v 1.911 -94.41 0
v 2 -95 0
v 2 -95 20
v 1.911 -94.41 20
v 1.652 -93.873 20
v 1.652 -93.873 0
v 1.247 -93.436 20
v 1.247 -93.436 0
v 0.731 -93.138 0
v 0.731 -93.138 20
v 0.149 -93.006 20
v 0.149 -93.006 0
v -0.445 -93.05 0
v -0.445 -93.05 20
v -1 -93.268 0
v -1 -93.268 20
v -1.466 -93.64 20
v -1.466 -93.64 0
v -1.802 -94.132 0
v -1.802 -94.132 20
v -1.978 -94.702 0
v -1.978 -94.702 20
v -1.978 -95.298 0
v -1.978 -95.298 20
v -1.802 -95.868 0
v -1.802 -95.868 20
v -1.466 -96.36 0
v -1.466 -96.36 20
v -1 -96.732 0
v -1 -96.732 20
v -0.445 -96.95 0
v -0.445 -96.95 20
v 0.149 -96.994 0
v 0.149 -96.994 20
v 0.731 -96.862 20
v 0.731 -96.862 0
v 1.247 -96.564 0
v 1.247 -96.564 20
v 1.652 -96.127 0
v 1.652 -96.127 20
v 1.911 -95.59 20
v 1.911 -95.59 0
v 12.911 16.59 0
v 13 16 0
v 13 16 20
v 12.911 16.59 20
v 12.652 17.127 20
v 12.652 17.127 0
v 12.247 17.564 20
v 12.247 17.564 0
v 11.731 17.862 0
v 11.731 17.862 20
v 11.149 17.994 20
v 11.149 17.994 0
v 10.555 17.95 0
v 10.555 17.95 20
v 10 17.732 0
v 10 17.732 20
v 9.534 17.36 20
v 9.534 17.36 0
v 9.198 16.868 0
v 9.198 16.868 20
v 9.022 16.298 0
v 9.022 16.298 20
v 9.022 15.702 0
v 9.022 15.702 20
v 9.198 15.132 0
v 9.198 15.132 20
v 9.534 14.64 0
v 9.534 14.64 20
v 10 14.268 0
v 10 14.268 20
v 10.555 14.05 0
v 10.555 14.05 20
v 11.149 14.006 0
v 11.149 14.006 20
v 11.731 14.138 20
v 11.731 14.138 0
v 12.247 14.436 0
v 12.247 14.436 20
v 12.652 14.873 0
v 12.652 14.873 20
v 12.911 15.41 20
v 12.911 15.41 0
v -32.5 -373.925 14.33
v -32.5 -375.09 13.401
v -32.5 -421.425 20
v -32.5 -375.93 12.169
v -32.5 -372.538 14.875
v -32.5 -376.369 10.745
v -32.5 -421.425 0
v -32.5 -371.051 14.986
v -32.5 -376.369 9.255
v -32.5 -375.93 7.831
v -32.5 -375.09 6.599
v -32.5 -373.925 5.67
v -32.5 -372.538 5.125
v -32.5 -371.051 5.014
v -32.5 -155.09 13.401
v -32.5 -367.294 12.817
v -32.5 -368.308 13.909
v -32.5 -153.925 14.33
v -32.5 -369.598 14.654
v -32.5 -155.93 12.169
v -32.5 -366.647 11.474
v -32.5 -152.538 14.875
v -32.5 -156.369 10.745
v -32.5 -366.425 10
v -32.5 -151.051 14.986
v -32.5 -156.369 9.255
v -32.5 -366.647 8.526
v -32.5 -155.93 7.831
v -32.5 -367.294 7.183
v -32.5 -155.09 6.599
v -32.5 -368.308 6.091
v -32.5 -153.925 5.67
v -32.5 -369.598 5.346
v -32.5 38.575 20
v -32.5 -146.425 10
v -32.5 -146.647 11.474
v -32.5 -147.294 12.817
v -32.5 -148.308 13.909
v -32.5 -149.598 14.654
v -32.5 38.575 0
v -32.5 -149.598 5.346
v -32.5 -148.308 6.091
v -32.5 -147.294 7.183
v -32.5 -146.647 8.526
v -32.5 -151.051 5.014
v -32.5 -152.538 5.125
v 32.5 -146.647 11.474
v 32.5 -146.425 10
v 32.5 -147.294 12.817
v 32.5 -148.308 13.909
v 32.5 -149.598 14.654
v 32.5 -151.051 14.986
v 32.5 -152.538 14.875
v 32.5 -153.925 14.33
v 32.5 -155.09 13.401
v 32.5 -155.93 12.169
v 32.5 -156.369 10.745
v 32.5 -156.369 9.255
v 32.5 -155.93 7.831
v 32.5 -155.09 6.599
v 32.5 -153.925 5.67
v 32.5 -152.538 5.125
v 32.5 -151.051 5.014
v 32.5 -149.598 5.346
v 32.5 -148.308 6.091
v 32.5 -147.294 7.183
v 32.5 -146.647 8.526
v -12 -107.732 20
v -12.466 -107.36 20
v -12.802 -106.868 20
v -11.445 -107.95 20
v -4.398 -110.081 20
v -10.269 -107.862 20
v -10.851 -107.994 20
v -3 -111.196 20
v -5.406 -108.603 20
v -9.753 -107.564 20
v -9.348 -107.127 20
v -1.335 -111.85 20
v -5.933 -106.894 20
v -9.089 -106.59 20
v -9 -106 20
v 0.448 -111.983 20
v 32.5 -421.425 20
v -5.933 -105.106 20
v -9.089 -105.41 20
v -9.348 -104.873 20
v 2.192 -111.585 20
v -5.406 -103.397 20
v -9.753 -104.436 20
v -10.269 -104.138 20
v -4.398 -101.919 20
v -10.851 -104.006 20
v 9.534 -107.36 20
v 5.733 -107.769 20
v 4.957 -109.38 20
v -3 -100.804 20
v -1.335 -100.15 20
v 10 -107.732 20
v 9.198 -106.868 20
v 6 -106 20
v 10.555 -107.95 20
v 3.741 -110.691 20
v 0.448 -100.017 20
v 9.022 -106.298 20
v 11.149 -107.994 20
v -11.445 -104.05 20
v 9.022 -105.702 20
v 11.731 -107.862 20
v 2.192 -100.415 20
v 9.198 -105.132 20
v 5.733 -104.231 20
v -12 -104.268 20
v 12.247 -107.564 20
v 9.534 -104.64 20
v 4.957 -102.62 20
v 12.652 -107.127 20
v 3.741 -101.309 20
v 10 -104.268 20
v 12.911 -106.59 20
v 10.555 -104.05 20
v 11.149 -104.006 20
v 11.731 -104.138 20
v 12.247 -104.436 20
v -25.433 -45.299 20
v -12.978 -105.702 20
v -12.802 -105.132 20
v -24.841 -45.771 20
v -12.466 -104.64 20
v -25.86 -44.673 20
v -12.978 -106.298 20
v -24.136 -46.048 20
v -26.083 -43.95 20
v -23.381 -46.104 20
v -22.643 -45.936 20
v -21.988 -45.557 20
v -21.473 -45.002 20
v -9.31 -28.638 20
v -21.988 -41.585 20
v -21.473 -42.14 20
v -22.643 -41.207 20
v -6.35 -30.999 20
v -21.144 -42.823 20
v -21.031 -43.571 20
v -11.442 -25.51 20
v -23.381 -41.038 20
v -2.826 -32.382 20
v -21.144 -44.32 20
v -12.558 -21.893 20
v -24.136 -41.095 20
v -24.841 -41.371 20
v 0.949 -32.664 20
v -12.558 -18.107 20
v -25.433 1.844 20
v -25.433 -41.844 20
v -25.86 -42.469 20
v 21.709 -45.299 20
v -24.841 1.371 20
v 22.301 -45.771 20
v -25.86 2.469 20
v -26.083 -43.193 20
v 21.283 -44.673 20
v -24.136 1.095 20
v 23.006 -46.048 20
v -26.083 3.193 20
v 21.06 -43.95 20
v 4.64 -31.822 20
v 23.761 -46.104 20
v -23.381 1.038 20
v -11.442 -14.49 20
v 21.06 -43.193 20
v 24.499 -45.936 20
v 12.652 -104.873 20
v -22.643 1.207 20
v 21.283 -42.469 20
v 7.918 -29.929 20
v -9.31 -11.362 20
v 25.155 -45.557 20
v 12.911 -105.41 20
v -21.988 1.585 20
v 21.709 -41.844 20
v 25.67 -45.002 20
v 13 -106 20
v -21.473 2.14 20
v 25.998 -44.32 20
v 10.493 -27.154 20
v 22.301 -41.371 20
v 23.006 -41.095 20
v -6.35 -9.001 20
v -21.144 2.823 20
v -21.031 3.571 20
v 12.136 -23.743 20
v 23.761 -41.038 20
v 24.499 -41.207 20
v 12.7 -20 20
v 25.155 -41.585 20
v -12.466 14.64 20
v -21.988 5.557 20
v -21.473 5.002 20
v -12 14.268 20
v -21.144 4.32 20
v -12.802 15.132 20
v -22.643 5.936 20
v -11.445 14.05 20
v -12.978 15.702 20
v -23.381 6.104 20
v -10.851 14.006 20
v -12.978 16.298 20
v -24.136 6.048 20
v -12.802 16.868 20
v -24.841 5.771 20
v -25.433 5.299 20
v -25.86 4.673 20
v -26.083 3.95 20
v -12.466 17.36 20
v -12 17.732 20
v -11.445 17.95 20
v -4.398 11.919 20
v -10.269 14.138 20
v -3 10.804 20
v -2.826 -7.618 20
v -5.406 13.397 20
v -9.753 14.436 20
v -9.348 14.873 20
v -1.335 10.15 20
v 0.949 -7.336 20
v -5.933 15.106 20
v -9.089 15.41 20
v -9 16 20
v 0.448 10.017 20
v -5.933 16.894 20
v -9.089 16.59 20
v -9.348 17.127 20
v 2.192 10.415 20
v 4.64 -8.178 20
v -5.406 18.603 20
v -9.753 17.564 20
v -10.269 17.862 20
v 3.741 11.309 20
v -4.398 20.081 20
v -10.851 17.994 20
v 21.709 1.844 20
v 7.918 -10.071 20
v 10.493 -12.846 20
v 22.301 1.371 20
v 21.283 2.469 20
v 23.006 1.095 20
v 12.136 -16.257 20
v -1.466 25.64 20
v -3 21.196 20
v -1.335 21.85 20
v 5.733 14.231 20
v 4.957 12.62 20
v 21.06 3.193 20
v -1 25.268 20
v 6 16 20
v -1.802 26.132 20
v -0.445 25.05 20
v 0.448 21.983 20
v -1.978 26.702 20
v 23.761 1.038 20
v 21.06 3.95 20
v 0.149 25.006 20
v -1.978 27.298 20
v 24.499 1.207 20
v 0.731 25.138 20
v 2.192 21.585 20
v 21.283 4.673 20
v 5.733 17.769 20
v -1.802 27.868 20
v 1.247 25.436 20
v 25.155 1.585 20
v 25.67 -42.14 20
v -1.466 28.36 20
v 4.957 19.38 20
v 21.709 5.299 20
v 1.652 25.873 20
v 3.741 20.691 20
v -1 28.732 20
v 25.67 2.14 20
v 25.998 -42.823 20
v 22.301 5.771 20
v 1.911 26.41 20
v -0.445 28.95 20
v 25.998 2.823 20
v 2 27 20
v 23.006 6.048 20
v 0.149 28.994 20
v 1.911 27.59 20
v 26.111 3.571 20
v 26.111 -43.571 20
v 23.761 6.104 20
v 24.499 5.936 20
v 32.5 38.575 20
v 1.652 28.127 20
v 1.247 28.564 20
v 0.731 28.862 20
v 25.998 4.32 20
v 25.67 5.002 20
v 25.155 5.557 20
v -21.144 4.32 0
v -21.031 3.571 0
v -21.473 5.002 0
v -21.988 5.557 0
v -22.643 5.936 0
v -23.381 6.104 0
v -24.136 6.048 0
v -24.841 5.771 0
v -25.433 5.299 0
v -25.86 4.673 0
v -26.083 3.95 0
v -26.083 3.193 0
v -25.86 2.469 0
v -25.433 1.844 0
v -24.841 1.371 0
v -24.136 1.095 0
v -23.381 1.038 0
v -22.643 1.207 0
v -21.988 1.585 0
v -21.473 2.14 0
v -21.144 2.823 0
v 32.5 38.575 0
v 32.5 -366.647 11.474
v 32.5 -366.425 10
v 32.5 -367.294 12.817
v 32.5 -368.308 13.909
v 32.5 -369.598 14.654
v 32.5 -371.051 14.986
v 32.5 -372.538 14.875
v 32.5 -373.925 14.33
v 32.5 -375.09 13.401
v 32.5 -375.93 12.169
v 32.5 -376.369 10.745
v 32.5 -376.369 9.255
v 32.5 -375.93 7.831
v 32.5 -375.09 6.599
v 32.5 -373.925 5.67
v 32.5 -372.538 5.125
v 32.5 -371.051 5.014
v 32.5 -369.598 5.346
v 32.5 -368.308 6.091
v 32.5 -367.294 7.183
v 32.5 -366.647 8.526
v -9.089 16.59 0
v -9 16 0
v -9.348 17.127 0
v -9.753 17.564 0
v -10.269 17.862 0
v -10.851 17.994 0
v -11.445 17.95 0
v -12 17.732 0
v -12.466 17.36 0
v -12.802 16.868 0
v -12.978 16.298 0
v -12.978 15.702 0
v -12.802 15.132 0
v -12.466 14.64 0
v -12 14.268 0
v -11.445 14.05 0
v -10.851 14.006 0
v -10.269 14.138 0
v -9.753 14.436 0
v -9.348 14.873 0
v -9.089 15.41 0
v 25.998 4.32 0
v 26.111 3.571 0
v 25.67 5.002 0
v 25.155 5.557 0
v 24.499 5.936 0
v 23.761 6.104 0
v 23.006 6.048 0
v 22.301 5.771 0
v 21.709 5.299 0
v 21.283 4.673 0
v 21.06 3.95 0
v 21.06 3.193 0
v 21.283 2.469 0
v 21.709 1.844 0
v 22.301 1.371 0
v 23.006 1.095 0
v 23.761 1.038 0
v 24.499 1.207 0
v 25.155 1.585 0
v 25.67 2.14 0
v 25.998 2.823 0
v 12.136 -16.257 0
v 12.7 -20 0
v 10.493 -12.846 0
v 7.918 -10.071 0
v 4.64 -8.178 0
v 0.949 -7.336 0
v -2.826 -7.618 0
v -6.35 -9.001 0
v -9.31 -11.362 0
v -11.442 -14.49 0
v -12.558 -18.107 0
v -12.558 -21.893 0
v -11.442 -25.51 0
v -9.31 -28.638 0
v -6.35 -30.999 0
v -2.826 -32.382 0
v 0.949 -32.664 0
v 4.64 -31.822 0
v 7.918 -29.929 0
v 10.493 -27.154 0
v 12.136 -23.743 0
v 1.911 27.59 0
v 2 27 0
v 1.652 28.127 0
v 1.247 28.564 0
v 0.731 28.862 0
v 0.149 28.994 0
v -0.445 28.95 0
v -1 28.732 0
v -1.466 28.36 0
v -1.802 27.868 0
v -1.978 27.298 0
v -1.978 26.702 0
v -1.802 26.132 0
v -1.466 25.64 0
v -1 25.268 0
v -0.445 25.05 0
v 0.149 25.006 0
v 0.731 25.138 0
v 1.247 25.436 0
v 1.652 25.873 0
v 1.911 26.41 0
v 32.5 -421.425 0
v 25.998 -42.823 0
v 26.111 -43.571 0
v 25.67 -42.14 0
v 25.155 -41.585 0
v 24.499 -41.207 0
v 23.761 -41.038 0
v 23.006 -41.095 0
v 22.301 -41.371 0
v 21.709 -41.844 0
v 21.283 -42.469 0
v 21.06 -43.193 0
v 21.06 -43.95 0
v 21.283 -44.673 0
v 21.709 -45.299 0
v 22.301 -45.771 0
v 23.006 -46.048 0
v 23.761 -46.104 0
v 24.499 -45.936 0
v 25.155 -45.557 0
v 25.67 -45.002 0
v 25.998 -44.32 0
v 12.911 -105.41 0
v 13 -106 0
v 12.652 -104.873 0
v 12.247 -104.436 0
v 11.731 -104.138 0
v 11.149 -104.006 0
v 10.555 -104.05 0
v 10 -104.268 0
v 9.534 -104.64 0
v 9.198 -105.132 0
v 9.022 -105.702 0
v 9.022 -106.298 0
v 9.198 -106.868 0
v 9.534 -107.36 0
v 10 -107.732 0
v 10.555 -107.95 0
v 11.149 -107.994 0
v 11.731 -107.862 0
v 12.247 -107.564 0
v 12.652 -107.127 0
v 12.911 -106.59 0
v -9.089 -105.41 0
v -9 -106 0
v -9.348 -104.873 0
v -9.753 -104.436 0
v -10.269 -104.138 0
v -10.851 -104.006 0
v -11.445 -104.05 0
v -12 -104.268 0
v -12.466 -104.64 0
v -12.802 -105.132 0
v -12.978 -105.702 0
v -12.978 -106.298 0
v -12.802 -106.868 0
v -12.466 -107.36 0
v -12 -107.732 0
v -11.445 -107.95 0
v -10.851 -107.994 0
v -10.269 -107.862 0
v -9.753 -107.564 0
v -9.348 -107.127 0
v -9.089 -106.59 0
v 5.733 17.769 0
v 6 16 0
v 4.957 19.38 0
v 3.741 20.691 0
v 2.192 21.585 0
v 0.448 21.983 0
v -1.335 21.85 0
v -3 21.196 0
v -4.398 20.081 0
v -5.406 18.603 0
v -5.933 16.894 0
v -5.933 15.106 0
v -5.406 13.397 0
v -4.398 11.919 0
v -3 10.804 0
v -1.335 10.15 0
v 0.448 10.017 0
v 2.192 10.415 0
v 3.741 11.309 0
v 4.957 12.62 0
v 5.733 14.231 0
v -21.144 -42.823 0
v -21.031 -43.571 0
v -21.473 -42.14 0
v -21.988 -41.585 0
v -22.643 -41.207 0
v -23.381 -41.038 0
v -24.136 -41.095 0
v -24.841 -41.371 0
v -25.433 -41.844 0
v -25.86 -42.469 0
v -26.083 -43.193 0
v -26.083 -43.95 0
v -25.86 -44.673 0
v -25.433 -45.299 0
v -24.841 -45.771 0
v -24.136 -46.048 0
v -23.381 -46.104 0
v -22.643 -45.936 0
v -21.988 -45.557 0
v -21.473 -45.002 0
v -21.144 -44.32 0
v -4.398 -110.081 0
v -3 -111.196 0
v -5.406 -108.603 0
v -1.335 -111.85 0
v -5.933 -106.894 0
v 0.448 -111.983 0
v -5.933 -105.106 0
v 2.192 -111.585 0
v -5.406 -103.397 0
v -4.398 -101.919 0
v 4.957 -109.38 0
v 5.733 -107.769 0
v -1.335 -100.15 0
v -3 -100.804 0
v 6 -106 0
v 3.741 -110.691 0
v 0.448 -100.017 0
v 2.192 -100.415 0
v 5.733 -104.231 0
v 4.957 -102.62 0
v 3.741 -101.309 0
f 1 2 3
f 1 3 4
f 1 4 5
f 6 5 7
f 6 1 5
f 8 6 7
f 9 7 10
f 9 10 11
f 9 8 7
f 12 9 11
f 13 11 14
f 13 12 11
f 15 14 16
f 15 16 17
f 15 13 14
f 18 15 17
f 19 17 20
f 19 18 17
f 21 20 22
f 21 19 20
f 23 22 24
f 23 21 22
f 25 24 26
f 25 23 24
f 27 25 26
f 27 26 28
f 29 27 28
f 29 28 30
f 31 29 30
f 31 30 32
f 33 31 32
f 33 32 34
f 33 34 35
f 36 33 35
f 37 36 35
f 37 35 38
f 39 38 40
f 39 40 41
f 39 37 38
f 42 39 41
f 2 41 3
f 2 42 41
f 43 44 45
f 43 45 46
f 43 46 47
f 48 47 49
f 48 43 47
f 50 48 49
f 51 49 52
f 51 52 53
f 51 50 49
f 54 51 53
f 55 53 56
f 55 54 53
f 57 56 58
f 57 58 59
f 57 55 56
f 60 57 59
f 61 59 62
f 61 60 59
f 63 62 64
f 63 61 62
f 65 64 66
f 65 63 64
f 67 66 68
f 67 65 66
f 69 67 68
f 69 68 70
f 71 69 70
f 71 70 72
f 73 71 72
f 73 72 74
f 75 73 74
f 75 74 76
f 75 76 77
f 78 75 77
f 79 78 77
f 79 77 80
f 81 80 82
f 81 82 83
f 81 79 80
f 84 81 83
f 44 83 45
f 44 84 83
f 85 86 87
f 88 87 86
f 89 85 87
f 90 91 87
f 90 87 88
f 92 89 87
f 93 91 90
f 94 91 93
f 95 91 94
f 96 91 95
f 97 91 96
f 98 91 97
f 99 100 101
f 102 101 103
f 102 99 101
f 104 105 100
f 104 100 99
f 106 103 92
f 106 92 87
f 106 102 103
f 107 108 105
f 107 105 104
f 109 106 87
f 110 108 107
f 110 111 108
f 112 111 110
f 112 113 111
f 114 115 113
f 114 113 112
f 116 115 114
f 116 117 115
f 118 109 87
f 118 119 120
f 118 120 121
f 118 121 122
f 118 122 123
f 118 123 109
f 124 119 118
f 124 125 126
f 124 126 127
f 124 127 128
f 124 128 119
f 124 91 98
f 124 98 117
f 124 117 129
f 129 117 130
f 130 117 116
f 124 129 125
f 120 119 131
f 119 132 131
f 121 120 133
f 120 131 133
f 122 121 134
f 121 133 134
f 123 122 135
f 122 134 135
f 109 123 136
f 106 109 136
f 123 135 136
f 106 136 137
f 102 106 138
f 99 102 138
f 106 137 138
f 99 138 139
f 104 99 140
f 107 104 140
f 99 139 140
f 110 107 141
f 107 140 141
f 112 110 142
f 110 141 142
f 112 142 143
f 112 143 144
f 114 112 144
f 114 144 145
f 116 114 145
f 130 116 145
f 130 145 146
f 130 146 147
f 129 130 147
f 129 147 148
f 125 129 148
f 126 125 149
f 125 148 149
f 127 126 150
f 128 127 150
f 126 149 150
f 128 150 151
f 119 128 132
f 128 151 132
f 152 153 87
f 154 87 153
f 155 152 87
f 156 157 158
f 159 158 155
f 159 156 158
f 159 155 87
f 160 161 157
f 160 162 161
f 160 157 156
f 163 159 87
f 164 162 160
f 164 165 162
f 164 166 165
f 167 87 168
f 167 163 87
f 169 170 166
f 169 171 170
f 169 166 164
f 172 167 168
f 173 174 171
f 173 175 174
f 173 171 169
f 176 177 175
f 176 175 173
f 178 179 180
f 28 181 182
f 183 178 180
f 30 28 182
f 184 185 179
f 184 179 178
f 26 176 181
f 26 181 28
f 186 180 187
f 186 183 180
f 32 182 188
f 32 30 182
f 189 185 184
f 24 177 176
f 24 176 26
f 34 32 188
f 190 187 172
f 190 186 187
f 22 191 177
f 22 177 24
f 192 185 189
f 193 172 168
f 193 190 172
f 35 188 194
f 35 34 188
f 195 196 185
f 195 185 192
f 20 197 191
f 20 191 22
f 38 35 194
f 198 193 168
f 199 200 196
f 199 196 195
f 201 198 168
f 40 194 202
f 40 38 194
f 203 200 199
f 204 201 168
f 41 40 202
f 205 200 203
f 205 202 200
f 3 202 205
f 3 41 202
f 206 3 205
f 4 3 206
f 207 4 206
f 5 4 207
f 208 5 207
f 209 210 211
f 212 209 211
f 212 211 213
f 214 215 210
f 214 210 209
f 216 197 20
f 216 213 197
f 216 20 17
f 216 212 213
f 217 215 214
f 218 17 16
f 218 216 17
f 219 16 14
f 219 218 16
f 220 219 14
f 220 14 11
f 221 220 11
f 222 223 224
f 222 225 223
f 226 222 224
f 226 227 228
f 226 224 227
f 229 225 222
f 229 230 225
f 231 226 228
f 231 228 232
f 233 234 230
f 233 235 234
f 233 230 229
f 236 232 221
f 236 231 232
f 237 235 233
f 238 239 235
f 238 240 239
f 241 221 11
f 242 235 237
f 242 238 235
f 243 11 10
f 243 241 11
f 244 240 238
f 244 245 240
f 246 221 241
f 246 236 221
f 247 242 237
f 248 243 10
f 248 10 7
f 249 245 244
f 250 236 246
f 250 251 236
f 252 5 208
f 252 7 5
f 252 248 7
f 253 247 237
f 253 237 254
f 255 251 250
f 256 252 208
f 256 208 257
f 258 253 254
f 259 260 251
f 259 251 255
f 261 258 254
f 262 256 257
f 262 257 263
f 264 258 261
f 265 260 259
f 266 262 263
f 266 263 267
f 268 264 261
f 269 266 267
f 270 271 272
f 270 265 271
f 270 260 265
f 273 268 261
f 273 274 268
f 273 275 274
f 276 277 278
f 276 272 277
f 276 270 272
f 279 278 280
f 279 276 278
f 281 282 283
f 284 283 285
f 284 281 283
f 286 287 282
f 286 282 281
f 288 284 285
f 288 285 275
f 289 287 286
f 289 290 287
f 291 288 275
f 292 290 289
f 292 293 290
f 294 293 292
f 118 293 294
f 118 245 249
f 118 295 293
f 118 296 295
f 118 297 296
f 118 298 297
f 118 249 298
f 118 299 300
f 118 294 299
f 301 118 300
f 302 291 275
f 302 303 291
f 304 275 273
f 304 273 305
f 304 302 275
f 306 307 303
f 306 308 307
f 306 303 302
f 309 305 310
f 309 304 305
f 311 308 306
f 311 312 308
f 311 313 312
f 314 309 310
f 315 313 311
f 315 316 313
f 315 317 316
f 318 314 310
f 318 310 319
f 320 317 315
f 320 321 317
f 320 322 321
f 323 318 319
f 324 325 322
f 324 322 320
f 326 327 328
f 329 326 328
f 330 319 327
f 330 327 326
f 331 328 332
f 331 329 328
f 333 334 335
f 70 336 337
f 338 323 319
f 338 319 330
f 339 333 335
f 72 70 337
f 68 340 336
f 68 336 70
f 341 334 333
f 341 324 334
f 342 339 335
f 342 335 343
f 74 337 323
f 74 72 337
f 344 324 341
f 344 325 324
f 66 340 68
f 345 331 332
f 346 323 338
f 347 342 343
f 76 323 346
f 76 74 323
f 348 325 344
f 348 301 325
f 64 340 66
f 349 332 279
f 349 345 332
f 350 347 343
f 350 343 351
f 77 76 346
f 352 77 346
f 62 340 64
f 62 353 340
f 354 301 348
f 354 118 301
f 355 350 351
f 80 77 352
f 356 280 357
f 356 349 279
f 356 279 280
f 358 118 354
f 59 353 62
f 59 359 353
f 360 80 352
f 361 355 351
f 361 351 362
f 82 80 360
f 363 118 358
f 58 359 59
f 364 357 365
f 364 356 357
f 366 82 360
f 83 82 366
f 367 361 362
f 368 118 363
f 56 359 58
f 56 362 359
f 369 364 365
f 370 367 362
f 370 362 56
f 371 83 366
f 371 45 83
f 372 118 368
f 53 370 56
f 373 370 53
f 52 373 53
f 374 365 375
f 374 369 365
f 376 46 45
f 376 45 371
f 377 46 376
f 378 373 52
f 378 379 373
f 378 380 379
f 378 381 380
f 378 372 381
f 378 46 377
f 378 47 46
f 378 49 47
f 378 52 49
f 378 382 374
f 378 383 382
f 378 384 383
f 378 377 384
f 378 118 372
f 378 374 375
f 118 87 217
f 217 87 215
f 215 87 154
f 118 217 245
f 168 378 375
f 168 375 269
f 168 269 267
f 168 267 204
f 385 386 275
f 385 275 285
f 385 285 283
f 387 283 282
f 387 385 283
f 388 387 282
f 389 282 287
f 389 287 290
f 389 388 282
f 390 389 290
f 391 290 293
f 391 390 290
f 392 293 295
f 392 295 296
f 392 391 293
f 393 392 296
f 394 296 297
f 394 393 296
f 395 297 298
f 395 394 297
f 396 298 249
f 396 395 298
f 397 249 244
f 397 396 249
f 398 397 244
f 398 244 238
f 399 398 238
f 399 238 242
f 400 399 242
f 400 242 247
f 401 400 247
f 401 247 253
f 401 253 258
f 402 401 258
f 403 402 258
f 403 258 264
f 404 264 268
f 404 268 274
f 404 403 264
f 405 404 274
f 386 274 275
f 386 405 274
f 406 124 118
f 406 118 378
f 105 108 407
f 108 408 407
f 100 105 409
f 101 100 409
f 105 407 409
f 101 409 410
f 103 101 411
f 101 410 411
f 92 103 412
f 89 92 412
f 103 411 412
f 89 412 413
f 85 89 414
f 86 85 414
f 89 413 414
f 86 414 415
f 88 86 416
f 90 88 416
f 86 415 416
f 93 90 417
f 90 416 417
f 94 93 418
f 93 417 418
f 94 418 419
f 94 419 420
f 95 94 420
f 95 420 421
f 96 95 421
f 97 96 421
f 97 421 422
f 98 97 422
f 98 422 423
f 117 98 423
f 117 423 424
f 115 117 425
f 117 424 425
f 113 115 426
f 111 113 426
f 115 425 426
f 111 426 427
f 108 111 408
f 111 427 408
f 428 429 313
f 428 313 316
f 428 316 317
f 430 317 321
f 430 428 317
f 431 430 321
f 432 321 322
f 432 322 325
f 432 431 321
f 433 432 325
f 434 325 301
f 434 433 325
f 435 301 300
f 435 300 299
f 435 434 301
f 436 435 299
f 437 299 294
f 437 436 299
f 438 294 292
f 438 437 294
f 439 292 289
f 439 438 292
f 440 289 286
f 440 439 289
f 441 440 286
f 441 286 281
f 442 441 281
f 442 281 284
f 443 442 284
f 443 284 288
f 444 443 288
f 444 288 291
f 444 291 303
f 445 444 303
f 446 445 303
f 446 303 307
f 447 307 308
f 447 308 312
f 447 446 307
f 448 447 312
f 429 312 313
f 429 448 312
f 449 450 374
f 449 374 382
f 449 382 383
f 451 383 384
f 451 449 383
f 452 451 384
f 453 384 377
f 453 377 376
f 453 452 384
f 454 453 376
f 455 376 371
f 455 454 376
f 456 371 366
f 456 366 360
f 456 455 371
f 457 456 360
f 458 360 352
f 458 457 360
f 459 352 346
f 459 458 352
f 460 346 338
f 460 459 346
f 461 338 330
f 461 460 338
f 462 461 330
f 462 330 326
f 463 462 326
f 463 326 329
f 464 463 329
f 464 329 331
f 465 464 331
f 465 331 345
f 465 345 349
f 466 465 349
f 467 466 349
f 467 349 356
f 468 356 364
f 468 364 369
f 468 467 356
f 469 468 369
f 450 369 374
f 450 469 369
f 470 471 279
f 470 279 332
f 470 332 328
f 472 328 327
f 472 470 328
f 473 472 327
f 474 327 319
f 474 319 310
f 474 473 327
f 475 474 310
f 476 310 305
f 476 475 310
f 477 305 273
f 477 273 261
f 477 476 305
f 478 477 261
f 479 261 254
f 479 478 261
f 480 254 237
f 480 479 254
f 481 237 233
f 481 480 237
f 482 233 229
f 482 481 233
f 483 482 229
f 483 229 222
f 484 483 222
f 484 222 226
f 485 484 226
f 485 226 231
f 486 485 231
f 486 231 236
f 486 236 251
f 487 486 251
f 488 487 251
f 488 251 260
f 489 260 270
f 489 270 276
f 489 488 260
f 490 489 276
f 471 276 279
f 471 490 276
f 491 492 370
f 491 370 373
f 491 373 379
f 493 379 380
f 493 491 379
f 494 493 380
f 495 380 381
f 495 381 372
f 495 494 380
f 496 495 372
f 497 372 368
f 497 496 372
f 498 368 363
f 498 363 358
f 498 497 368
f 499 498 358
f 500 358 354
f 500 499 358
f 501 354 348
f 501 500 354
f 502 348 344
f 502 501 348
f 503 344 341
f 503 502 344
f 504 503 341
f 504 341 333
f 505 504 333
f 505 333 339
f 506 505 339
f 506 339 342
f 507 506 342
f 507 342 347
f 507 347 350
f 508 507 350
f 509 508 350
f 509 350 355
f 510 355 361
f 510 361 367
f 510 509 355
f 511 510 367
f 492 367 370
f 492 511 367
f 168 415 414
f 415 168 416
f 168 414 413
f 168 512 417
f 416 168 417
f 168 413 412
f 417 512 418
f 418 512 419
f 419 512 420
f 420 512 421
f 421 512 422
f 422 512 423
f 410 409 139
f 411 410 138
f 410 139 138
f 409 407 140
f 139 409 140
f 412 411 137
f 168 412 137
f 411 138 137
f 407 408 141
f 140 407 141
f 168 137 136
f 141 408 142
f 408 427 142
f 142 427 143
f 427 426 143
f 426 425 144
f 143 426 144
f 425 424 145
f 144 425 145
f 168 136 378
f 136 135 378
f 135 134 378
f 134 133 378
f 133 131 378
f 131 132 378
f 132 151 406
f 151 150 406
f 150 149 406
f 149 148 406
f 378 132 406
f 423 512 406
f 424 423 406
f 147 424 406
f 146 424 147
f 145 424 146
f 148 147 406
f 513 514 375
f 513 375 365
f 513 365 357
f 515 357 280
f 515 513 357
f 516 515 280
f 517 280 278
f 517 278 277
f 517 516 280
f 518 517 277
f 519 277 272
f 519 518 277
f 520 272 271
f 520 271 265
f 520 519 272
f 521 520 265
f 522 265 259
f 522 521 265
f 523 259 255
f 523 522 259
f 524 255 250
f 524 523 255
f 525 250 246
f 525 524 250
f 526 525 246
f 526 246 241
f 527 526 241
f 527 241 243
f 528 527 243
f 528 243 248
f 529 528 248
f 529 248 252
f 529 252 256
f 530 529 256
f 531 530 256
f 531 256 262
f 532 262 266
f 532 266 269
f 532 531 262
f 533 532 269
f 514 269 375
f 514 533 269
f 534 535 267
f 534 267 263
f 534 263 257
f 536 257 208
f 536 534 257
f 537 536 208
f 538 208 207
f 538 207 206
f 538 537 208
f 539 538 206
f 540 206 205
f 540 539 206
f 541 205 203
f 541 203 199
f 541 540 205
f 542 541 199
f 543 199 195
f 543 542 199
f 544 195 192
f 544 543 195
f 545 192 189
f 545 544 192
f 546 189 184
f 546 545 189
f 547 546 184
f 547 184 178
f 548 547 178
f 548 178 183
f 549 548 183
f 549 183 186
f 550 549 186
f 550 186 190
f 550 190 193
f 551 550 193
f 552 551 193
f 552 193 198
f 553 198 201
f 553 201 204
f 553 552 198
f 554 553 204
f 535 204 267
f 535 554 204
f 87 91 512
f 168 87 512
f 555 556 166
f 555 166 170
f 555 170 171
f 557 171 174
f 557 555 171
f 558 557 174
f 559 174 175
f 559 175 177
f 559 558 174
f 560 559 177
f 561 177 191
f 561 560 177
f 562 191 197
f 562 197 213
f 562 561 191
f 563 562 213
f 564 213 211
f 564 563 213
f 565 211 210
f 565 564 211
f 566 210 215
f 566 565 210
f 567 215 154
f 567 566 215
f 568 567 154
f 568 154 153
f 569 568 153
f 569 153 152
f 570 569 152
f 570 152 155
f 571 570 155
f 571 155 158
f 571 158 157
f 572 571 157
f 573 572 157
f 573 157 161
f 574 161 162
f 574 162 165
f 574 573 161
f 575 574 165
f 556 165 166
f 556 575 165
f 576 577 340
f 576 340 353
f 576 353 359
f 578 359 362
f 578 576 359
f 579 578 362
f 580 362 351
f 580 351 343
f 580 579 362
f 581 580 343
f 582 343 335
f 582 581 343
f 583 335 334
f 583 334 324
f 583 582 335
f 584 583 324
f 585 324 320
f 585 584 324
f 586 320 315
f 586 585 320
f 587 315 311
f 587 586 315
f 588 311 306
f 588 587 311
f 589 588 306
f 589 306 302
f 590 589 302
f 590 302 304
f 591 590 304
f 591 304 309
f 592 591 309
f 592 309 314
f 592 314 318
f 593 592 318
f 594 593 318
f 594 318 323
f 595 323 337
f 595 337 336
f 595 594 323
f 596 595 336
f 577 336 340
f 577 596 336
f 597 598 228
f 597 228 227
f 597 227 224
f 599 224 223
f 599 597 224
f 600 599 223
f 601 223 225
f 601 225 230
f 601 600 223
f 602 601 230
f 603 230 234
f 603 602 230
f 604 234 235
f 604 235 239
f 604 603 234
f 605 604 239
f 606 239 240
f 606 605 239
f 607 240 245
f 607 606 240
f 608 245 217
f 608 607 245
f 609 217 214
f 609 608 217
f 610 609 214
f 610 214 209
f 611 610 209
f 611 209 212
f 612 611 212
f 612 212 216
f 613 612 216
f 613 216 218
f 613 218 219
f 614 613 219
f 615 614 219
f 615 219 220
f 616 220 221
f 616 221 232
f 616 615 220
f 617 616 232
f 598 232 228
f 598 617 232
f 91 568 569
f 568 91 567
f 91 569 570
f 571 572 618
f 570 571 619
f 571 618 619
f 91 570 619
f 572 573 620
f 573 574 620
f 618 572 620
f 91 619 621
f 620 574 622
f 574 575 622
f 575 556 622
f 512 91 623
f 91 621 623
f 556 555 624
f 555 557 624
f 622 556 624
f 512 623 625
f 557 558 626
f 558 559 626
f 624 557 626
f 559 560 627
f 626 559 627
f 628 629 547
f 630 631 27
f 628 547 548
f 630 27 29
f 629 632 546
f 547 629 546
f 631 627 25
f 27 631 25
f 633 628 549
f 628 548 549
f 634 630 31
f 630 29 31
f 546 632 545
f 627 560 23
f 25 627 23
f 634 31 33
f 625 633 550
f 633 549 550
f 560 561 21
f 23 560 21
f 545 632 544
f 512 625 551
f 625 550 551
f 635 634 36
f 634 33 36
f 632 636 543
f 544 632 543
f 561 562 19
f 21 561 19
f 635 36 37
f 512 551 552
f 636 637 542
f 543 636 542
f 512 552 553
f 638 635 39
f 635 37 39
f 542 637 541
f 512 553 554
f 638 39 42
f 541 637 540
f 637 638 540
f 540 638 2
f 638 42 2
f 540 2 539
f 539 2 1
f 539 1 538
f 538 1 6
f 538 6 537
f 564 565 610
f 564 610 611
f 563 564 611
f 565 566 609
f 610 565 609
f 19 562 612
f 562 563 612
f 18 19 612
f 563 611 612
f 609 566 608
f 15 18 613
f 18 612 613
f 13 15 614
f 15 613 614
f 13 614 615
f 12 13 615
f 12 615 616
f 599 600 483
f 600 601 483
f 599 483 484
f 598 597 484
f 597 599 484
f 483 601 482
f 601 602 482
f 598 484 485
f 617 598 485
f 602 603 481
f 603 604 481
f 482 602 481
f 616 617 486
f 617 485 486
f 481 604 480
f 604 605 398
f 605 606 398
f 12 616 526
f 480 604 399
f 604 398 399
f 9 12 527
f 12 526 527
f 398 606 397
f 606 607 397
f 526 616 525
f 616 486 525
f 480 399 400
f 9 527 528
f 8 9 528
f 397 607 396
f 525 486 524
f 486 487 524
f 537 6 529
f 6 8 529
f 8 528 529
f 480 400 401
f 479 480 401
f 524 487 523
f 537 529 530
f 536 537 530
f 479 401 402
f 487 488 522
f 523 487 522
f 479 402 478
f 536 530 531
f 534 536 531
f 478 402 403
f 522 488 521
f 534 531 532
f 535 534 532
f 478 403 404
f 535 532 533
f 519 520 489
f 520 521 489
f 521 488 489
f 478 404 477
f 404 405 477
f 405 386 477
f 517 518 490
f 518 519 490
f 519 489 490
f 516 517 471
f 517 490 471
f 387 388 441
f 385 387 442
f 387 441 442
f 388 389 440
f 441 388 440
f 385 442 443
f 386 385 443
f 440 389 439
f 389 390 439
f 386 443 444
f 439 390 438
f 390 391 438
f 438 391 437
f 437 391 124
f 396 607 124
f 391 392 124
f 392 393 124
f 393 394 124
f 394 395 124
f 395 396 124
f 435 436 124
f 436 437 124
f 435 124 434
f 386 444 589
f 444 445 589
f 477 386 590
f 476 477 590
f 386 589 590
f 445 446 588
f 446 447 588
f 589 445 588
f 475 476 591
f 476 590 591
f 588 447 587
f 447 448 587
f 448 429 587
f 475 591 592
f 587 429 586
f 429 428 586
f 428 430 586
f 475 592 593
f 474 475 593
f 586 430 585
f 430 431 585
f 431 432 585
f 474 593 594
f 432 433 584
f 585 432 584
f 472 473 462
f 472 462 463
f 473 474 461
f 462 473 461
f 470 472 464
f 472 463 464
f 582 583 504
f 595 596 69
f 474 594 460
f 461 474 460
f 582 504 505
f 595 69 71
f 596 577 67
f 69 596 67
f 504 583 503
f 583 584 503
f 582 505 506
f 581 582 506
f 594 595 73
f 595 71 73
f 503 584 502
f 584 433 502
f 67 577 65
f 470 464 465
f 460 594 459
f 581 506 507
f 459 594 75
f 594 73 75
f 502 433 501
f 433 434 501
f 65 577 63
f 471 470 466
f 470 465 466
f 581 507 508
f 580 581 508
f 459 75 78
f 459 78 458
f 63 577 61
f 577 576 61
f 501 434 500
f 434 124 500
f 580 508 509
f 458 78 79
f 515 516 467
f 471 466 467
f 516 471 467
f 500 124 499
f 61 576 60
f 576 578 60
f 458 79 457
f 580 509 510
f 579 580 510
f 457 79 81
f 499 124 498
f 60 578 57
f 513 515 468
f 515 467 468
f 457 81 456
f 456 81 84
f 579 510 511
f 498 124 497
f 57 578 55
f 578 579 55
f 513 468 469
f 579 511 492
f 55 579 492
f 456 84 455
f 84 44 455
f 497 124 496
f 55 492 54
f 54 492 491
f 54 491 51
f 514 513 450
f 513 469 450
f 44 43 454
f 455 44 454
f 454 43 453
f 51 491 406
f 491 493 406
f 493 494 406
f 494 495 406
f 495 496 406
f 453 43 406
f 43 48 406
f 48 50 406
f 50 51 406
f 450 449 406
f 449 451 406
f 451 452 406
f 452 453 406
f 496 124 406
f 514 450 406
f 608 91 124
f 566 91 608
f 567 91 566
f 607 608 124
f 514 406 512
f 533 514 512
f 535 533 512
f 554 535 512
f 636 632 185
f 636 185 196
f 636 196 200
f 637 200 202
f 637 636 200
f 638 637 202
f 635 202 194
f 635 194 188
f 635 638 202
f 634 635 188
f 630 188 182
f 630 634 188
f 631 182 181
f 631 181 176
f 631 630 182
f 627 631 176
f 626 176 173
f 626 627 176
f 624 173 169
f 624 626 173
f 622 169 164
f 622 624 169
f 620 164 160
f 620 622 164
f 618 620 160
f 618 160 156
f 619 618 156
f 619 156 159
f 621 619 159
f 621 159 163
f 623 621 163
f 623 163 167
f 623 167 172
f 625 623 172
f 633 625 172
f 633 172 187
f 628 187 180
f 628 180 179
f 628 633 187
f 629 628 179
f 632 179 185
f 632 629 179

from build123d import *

# Parameters (mm, degrees)
SKETCH1_W           = 65
SKETCH1_H           = 460
SKETCH1_R           = 2.54
SKETCH1_R_2         = 6
SKETCH1_R_3         = 2
SKETCH1_R_4         = 12.7
BOSS_EXTRUDE1_DEPTH = 20
SKETCH2_R           = 5
CUT_EXTRUDE1_DEPTH  = 40


with BuildPart() as part:
    # Sketch1 → Boss-Extrude1 (new body)
    with BuildSketch(Plane.XY):
        with Locations((0, -191.425)):
            Rectangle(SKETCH1_W, SKETCH1_H)
        with Locations((-23.5712, 3.5712)):
            Circle(SKETCH1_R, mode=Mode.SUBTRACT)
        with Locations((23.5712, 3.5712)):
            Circle(SKETCH1_R, mode=Mode.SUBTRACT)
        with Locations((23.5712, -43.5712)):
            Circle(SKETCH1_R, mode=Mode.SUBTRACT)
        with Locations((-23.5712, -43.5712)):
            Circle(SKETCH1_R, mode=Mode.SUBTRACT)
        with Locations((0, -106)):
            Circle(SKETCH1_R_2, mode=Mode.SUBTRACT)
        with Locations((11, -106)):
            Circle(SKETCH1_R_3, mode=Mode.SUBTRACT)
        with Locations((0, -20)):
            Circle(SKETCH1_R_4, mode=Mode.SUBTRACT)
        with Locations((0, -95)):
            Circle(SKETCH1_R_3, mode=Mode.SUBTRACT)
        with Locations((0, 16)):
            Circle(SKETCH1_R_2, mode=Mode.SUBTRACT)
        with Locations((11, 16)):
            Circle(SKETCH1_R_3, mode=Mode.SUBTRACT)
        with Locations((-11, -106)):
            Circle(SKETCH1_R_3, mode=Mode.SUBTRACT)
        with Locations((0, 27)):
            Circle(SKETCH1_R_3, mode=Mode.SUBTRACT)
        with Locations((-11, 16)):
            Circle(SKETCH1_R_3, mode=Mode.SUBTRACT)
    extrude(amount=BOSS_EXTRUDE1_DEPTH)

    # Sketch2 → Cut-Extrude1 (cut, symmetric)
    with BuildSketch(Plane(origin=(0, 0, 0), x_dir=(0, 0, -1), z_dir=(1, 0, 0))):
        with Locations(Location((-10, -151.425, 0), (0, 0, 90))):
            Circle(SKETCH2_R)
        with Locations(Location((-10, -371.425, 0), (0, 0, 90))):
            Circle(SKETCH2_R)
    extrude(amount=CUT_EXTRUDE1_DEPTH, both=True, mode=Mode.SUBTRACT)


solid = part.part
